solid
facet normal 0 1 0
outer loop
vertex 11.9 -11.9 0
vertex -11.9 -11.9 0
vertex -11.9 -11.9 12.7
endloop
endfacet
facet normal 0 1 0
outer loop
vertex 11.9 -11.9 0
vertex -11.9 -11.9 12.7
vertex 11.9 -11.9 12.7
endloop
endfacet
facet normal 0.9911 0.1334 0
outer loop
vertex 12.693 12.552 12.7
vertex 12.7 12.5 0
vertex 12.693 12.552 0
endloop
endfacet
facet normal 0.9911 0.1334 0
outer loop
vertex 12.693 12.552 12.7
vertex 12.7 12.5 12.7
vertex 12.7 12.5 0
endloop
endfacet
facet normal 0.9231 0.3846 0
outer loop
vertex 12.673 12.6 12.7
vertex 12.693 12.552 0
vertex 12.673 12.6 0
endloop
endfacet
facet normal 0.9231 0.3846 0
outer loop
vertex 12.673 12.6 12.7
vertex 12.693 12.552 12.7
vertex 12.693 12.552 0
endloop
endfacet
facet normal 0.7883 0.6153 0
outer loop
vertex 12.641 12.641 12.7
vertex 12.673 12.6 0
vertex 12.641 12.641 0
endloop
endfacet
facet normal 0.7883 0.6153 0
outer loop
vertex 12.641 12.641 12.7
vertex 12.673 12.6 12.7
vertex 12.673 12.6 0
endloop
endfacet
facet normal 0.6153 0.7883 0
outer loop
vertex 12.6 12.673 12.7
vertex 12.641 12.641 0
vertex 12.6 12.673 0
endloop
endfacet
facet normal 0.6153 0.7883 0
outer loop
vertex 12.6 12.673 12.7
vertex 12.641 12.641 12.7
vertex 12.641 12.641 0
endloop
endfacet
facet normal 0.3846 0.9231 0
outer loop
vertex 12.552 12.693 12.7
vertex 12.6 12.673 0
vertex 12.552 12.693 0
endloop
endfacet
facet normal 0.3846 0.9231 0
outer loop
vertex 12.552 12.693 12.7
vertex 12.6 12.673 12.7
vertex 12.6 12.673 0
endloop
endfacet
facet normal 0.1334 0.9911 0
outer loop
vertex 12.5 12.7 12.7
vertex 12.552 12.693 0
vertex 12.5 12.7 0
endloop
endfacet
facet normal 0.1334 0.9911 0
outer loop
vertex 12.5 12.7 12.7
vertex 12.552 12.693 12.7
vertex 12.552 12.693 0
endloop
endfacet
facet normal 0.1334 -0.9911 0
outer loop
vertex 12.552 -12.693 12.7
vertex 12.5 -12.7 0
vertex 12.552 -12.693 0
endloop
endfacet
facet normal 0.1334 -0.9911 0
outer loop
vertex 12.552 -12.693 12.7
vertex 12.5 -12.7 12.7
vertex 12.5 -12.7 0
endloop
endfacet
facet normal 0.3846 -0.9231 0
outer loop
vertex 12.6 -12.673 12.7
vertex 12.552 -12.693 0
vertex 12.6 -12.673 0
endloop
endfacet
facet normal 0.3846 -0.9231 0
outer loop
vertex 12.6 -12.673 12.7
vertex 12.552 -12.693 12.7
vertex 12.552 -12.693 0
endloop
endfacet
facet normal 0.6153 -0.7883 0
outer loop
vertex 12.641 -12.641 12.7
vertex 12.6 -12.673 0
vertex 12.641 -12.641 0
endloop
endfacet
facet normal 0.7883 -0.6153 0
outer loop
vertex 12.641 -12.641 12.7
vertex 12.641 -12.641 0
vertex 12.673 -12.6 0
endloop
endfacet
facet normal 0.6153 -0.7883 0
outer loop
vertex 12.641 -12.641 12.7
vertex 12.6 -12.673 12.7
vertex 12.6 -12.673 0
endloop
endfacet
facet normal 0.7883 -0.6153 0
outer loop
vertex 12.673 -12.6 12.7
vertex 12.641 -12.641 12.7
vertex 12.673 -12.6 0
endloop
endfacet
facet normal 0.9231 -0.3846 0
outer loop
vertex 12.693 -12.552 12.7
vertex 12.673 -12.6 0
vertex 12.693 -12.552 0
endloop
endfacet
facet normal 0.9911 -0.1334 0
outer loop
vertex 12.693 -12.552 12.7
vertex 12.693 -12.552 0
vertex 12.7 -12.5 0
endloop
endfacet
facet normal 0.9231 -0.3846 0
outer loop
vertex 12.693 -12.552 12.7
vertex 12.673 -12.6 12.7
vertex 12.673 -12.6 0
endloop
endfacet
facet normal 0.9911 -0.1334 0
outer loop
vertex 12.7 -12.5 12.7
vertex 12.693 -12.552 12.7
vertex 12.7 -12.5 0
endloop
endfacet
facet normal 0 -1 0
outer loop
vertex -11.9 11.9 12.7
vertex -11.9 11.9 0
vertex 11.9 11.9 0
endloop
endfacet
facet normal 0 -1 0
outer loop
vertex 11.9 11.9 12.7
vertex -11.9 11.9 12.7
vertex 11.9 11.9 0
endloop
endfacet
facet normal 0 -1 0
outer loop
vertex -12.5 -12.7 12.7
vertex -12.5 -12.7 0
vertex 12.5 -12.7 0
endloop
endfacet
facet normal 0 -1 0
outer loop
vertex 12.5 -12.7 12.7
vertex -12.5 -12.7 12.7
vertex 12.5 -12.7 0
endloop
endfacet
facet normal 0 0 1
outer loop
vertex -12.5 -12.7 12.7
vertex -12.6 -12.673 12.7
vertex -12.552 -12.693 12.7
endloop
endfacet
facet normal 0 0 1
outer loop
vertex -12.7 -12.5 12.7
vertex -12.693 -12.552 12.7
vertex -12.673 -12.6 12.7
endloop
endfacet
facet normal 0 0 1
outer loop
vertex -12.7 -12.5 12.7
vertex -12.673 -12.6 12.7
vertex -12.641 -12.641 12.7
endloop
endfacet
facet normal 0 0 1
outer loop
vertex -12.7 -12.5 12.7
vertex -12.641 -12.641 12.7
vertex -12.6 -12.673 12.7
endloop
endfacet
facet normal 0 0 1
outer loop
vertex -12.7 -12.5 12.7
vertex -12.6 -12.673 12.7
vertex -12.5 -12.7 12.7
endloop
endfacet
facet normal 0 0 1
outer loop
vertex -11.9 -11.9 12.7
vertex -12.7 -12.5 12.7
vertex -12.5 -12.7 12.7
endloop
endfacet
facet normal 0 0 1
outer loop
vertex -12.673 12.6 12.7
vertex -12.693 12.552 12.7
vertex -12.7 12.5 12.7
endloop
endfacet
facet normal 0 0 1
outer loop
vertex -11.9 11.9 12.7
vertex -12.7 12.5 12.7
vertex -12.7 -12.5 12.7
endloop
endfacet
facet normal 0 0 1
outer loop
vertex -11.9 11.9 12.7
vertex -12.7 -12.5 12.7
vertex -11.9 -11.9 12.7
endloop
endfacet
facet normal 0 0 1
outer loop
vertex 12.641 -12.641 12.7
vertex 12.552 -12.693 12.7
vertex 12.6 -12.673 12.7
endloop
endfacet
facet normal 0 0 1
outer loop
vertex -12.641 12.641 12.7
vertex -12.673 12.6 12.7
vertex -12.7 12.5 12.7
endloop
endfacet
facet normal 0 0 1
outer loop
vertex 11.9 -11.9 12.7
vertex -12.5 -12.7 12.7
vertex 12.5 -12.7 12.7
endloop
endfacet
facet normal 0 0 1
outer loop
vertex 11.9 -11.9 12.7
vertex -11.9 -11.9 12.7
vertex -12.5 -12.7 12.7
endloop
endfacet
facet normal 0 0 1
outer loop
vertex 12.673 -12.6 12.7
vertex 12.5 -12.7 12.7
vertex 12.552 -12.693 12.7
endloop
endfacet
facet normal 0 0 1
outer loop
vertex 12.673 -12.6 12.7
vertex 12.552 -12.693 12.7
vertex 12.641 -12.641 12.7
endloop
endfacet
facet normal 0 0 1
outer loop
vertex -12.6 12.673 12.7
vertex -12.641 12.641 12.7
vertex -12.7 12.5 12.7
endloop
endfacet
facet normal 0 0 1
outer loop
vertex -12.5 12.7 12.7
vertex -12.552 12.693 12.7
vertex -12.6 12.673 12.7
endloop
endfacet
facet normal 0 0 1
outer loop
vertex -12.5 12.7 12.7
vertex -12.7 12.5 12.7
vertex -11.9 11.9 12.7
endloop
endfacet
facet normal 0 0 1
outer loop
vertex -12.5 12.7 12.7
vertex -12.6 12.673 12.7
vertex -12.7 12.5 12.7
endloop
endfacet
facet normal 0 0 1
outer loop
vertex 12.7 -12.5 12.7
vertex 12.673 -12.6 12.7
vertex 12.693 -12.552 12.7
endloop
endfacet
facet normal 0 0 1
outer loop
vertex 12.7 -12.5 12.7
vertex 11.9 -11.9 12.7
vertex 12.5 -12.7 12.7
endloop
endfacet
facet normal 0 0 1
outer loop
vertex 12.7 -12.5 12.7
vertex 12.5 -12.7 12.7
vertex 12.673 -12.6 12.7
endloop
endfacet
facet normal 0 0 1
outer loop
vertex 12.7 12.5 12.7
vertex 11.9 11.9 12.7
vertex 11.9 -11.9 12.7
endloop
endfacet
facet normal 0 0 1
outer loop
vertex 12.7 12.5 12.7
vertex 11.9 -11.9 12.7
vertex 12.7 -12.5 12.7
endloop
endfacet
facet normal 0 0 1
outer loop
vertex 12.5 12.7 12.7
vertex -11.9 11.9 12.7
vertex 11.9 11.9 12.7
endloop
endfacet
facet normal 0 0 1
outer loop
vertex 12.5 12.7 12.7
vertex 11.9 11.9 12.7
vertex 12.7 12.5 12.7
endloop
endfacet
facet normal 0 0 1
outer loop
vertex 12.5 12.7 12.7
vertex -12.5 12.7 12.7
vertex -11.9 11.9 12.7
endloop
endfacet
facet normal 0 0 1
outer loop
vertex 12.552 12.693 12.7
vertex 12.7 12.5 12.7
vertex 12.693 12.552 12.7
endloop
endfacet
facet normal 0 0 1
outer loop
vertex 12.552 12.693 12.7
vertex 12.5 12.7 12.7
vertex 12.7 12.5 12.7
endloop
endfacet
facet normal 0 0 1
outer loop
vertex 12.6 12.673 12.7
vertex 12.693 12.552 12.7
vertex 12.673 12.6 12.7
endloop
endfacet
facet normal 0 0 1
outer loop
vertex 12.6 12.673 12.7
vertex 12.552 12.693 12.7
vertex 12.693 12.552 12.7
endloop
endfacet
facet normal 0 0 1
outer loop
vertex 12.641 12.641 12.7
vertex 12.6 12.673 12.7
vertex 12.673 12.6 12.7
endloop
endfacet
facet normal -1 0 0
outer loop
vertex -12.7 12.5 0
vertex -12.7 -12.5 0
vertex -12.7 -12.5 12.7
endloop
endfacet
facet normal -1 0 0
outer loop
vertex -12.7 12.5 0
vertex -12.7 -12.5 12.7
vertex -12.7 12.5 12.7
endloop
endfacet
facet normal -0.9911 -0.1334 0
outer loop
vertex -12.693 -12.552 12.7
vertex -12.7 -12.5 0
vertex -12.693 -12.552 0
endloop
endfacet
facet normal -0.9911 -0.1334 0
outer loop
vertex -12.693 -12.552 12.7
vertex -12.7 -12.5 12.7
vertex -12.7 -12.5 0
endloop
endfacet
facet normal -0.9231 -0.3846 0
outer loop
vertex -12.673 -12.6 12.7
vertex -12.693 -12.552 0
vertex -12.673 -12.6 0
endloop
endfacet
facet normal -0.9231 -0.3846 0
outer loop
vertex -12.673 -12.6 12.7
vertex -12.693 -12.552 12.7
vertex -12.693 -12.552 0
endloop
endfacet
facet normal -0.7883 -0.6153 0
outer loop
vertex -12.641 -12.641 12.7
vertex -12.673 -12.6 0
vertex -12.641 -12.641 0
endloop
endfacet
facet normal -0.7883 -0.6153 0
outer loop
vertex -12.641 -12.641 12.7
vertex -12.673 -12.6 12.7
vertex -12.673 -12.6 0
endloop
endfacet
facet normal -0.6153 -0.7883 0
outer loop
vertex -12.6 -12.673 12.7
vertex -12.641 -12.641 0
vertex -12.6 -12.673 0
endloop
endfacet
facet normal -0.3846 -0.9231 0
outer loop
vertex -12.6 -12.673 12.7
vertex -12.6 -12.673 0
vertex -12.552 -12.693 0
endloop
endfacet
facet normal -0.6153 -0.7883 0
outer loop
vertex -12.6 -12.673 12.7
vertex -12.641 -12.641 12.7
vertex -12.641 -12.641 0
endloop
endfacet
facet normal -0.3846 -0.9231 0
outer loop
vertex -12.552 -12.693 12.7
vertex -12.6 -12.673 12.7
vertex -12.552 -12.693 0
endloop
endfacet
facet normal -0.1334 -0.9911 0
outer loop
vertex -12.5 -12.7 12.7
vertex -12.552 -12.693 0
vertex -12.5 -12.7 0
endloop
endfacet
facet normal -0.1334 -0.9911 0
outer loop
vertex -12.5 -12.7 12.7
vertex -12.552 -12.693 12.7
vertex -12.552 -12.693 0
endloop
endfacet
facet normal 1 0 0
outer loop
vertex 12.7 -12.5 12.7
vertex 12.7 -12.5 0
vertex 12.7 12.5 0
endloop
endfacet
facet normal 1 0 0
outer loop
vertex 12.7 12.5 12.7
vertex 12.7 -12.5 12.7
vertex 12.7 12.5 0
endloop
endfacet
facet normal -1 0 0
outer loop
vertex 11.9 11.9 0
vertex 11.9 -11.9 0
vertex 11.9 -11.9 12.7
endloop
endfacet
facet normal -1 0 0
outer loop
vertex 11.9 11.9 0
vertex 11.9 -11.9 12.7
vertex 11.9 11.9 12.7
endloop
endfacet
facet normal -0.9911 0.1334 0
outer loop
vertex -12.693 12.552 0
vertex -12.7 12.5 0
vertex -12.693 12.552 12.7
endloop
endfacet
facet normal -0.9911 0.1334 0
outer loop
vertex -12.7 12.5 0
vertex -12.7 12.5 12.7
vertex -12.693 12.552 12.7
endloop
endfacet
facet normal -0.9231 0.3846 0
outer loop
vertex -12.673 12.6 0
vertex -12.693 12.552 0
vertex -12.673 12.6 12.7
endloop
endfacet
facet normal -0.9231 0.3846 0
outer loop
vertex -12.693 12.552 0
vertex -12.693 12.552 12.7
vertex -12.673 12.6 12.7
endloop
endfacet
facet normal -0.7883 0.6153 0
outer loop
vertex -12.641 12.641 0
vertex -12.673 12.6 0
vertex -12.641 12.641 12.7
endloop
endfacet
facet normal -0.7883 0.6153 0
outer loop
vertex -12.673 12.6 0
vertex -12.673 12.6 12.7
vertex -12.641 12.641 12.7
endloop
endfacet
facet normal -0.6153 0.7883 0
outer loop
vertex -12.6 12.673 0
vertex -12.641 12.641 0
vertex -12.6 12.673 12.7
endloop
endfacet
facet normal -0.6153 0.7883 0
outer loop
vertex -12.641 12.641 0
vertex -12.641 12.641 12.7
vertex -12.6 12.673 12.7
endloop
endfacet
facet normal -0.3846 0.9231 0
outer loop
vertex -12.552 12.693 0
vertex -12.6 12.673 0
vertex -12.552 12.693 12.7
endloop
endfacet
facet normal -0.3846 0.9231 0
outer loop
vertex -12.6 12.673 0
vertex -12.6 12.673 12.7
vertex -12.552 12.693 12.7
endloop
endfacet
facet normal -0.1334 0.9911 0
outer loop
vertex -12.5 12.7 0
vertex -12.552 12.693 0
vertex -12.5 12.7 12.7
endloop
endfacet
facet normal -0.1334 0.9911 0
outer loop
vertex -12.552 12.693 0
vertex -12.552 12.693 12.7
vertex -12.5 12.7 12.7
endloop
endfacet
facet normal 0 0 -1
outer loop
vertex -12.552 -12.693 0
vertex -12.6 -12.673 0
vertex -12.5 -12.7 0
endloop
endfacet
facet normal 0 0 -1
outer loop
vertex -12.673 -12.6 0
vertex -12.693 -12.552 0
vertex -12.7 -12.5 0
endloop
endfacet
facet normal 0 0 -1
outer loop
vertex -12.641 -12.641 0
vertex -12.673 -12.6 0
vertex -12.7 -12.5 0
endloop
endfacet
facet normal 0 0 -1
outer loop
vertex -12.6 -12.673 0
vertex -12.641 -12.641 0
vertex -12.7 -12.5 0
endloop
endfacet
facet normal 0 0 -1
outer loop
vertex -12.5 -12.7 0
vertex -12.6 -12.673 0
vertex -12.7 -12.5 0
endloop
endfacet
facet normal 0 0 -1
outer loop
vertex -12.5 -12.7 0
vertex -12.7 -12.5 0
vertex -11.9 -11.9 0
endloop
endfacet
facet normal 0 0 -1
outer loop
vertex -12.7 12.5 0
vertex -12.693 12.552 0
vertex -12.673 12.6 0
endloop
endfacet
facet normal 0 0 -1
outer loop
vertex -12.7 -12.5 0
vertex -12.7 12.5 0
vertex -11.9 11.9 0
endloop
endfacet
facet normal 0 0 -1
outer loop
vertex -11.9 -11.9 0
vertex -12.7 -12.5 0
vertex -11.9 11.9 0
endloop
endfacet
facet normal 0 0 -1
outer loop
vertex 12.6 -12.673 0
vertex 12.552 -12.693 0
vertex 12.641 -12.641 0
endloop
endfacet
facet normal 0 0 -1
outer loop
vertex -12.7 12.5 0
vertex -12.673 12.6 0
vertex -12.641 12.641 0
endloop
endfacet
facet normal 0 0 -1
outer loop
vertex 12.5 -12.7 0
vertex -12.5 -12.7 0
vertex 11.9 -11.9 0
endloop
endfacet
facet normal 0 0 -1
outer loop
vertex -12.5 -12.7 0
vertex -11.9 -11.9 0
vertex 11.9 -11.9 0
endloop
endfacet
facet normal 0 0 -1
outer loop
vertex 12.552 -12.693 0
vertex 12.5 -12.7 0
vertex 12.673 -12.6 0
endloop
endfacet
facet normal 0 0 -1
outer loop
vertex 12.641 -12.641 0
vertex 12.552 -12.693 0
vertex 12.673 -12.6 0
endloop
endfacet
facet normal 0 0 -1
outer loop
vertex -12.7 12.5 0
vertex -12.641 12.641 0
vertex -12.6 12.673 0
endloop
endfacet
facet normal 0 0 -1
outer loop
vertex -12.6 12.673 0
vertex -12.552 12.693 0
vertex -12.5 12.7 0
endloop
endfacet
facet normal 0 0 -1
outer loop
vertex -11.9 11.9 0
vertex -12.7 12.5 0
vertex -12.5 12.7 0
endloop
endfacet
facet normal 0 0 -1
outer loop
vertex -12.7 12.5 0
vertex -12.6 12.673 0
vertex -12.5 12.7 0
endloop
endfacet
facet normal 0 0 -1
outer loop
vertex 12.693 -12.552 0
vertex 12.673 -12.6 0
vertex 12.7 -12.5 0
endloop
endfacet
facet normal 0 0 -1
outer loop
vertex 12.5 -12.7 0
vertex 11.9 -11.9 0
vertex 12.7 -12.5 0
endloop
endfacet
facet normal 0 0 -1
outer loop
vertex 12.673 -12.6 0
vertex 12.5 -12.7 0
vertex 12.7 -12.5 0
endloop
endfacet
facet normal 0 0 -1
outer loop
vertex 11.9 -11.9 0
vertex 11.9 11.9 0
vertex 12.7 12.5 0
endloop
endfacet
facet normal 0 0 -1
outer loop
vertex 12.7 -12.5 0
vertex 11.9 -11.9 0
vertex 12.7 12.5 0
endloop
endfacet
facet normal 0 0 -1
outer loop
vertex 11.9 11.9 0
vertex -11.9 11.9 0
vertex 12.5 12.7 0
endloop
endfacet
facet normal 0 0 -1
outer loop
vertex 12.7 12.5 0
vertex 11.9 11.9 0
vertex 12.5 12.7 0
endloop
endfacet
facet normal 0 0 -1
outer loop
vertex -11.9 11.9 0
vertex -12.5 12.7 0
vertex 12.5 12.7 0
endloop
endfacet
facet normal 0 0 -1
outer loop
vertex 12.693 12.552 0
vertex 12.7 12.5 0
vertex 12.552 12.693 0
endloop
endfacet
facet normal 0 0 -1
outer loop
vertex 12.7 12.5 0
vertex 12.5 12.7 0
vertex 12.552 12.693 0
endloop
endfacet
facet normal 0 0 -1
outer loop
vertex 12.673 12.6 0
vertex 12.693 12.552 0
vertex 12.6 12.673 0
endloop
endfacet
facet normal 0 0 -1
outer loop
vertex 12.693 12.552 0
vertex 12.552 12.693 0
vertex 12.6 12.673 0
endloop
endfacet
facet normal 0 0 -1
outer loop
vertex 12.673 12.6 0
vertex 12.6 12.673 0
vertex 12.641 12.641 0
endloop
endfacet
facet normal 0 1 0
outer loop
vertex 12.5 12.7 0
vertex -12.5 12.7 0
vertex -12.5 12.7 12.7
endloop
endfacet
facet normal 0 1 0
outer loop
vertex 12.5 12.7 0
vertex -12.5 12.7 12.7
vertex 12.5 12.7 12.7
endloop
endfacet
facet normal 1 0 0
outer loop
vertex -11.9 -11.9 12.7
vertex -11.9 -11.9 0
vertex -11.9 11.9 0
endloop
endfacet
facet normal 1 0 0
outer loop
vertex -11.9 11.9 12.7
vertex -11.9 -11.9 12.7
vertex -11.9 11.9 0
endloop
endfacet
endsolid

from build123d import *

# Parameters (mm, degrees)
F0_W     = 25.4
F0_H     = 25.4
F1_DEPTH = 12.7
F2_R     = 0.2
F3_T     = -0.8


with BuildPart() as f1:
    # F0 (on Top) → F1 (new body)
    with BuildSketch(Plane.XY):
        Rectangle(F0_W, F0_H)
    extrude(amount=F1_DEPTH)

    # F2
    f2_edges = [f1.edges().sort_by_distance(p)[0] for p in [
        (12.7, -12.7, 6.35),
        (12.7, 12.7, 6.35),
        (-12.7, -12.7, 6.35),
        (-12.7, 12.7, 6.35),
    ]]
    fillet(f2_edges, radius=F2_R)

    # F3
    f3_openings = [f1.faces().sort_by_distance(p)[0] for p in [
        (0, 0, 12.7),
        (0, 0, 0),
    ]]
    offset(amount=F3_T, openings=f3_openings)


solid = f1.part
